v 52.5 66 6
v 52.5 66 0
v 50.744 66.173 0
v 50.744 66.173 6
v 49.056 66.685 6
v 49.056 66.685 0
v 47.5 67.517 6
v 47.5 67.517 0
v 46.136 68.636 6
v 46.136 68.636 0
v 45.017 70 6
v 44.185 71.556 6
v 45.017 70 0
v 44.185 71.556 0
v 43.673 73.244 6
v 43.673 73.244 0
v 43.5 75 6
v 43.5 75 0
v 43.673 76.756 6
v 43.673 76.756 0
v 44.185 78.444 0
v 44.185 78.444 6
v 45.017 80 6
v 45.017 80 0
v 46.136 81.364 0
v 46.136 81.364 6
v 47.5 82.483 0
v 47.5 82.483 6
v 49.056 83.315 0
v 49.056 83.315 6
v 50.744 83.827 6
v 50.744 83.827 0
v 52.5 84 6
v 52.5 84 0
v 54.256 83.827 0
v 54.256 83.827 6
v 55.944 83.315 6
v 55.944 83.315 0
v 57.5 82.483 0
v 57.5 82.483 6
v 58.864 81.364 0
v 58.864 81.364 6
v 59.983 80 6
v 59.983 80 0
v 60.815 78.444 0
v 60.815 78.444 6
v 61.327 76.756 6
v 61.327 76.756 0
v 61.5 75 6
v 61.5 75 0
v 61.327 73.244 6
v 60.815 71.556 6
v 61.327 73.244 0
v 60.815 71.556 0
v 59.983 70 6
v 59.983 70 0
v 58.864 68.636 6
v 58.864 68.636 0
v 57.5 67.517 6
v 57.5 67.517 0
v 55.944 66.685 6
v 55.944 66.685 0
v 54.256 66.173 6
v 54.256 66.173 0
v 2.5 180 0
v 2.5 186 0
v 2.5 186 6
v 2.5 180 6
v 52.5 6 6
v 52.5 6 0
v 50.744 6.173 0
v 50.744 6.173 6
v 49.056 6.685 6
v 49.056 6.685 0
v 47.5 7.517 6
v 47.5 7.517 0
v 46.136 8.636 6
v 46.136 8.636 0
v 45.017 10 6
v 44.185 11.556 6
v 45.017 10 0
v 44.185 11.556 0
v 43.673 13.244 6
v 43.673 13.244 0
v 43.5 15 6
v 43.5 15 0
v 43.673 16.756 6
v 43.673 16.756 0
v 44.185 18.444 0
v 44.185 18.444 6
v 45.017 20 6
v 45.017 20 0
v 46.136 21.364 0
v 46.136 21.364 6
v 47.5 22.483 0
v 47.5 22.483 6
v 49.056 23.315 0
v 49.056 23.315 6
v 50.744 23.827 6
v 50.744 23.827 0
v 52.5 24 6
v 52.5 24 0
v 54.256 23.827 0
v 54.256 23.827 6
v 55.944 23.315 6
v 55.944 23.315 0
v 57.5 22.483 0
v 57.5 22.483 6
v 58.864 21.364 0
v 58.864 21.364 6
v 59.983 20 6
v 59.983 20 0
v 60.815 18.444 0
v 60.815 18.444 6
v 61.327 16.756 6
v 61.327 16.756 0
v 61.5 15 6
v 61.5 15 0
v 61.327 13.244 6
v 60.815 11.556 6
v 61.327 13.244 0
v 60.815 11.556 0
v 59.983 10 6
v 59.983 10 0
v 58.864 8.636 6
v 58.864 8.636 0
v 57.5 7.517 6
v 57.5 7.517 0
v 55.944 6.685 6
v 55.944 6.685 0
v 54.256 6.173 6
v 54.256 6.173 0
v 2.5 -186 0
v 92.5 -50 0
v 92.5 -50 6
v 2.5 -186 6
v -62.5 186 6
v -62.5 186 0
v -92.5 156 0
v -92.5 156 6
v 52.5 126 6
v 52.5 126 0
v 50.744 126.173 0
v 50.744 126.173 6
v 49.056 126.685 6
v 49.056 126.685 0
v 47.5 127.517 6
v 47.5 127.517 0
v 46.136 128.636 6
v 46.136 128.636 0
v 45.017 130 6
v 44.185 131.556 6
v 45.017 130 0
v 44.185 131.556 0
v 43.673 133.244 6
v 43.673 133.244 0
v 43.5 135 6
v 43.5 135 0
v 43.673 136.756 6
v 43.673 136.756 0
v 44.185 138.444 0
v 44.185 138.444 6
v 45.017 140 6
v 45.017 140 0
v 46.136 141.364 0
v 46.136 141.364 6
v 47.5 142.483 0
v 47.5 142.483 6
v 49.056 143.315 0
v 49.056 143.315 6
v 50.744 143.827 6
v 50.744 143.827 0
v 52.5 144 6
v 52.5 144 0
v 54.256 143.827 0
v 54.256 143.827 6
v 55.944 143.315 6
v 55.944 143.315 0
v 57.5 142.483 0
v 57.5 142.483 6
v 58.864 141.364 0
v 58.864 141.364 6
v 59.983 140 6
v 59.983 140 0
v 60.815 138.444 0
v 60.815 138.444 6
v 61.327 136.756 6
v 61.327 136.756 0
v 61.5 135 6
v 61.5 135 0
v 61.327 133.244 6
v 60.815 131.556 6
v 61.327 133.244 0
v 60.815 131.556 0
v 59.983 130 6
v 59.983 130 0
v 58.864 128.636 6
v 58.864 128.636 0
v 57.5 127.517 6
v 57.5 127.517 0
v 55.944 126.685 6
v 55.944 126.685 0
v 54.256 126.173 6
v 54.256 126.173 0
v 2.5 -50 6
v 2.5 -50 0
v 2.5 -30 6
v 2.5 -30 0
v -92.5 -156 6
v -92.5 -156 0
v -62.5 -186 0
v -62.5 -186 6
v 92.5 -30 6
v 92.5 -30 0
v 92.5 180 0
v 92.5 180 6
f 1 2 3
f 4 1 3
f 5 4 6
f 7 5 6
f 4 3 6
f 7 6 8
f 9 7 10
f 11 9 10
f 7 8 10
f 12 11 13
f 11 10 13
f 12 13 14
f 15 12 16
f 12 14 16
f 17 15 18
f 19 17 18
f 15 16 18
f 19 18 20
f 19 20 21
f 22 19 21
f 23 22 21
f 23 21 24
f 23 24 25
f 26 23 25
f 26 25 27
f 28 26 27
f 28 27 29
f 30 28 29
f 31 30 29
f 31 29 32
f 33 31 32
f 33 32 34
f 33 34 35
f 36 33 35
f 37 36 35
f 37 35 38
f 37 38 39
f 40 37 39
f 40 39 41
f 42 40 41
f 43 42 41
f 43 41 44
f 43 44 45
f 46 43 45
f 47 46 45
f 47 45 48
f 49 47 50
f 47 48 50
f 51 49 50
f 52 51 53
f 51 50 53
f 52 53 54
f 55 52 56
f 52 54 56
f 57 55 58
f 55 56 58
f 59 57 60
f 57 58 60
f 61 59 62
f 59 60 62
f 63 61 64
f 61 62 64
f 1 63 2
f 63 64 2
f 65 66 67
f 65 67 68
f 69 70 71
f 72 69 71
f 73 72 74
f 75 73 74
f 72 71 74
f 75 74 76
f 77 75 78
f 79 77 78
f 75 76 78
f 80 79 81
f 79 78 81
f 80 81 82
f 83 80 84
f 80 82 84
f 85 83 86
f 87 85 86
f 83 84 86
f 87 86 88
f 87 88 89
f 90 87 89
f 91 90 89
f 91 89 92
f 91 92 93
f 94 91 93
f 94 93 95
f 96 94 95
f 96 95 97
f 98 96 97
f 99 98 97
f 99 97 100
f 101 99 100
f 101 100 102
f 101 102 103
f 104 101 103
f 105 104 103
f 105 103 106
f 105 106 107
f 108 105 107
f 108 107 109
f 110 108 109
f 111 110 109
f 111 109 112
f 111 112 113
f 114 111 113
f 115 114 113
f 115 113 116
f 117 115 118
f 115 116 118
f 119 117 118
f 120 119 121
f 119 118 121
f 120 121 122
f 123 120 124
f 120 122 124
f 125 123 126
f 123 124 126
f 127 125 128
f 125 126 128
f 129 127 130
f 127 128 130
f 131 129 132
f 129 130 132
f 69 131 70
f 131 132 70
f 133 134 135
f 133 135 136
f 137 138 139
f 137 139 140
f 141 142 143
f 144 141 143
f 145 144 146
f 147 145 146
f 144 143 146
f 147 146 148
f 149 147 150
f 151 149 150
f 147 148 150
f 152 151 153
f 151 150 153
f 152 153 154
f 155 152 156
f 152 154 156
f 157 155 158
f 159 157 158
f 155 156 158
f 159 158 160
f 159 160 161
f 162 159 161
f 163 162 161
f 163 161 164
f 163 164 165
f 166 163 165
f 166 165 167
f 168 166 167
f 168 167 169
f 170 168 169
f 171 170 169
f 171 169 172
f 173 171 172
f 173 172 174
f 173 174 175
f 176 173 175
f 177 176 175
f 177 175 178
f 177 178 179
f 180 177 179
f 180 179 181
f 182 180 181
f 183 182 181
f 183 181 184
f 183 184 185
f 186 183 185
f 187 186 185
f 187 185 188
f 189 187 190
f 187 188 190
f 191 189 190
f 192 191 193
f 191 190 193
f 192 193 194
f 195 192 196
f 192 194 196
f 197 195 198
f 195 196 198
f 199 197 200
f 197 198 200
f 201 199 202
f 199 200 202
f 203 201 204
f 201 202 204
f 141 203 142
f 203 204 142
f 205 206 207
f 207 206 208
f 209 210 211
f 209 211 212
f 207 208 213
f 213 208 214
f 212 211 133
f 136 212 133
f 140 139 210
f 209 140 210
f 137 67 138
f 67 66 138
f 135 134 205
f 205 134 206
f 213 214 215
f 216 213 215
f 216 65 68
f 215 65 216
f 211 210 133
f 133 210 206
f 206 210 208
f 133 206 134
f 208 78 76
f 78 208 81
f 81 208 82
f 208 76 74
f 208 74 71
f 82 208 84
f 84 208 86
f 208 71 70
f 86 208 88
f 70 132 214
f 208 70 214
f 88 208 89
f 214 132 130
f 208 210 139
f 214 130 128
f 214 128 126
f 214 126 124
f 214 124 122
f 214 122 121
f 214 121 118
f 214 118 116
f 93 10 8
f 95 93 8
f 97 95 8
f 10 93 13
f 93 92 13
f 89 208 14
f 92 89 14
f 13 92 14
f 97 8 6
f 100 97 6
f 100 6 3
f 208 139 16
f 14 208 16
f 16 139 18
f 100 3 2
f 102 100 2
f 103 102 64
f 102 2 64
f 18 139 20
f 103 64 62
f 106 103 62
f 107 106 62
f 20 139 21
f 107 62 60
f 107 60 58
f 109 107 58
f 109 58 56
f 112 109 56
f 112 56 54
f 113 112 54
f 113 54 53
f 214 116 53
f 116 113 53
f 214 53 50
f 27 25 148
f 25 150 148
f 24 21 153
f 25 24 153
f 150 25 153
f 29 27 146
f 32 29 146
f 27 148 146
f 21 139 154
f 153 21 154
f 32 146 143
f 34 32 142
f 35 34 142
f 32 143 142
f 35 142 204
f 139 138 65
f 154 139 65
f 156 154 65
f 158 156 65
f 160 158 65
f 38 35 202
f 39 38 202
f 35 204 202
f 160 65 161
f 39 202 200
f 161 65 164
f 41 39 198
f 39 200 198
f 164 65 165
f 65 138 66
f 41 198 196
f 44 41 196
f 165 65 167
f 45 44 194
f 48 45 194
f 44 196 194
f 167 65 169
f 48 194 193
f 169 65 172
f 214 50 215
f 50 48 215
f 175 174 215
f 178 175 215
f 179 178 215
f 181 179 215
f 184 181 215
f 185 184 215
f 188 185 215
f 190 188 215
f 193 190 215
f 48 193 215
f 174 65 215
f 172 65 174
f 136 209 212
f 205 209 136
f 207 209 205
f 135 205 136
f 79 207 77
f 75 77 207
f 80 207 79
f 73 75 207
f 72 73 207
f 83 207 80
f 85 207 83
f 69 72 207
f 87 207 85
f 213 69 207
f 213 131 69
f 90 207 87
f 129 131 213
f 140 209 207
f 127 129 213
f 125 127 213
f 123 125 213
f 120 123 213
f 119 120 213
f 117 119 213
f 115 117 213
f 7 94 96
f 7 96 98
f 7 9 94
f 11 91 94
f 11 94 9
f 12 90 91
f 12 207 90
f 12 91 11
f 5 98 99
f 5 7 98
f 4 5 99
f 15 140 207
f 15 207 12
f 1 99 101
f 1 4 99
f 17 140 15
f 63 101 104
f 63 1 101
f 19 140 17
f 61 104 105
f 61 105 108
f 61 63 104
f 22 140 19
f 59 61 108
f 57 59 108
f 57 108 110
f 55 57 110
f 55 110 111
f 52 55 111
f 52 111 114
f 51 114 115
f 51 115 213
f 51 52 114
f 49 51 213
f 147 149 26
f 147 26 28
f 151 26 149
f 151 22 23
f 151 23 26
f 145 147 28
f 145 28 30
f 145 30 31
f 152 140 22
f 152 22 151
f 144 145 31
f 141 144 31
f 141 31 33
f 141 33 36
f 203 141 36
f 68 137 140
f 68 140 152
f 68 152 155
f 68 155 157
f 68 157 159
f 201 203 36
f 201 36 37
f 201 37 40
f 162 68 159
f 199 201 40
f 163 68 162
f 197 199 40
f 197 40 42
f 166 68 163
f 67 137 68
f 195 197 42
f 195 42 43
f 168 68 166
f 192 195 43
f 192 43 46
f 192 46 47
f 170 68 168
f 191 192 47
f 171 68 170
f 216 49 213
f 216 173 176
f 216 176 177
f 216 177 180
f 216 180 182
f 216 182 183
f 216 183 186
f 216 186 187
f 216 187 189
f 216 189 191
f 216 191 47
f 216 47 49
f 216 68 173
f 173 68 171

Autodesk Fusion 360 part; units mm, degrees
sketch "スケッチ1" plane through (0, 0, 0) normal (0, 0, 1) x (1, 0, 0)
  line L0 (2.5, 186) -> (-92.5, 186)
  line L1 (-92.5, 186) -> (-92.5, -186)
  line L2 (-92.5, -186) -> (2.5, -186)
  line L3 (92.5, -30) -> (92.5, 180)
  line L4 (89.5161, 180) -> (-92.5, -186) construction
  line L5 (-92.5, 186) -> (53.8847, -108.352) construction
  line L6 (2.5, 186) -> (2.5, 180)
  line L7 (2.5, 180) -> (92.5, 180)
  line L8 (-92.5, -186) -> (2.5, -186) construction
  line L9 (92.5, -50) -> (2.5, -186)
  line L10 (92.5, -50) -> (2.5, -50)
  line L11 (2.5, -50) -> (2.5, -30)
  line L12 (2.5, -30) -> (92.5, -30)
  dimension "d2" = 372
  dimension "d5" = 95
  dimension "d7" = 90
  dimension "d8" = 20
extrude "押し出し1" add sketch "スケッチ1" along normal blind 6
chamfer "面取り1" distance 30 angle 45 2 edges at (-92.5, -186, 3) (-92.5, 186, 3)
sketch "スケッチ2" plane through (0, 0, 6) normal (0, 0, 1) x (-1, 0, 0)
  line L0 (62.5, -186) -> (92.5, -156)
  line L1 (92.5, -156) -> (92.5, 156)
  line L2 (92.5, 156) -> (62.5, 186)
  line L3 (62.5, 186) -> (-2.5, 186)
  line L4 (-2.5, 186) -> (-92.5, 50)
  line L5 (-92.5, 50) -> (-2.5, 50)
  line L6 (-2.5, 50) -> (-2.5, 30)
  line L7 (-2.5, 30) -> (-92.5, 30)
  line L8 (-92.5, 30) -> (-92.5, -180)
  line L9 (-92.5, -180) -> (-2.5, -180)
  line L10 (-2.5, -180) -> (-2.5, -186)
  line L11 (-2.5, -186) -> (62.5, -186)
  line L12 (-92.5, -180) -> (-52.5, -180) construction
  line L13 (-52.5, -180) -> (-52.5, -135) construction
  line L14 (-52.5, -135) -> (-92.5, -135) construction
  line L15 (-92.5, -135) -> (-92.5, -180) construction
  line L16 (-52.5, -135) -> (-52.5, -75) construction
  line L17 (-52.5, -75) -> (-52.5, -15) construction
  point P0 (-52.5, -135)
  point P1 (-52.5, -75)
  dimension "d12" = 40
  dimension "d13" = 45
  dimension "d14" = 60
  dimension "d15" = 60
hole "穴1" at (52.5, 135, 6) at (52.5, 75, 6) at (52.5, 15, 6) direction (0, 0, -1) diameter 18 end through all
equation "d5 = 30 mm + 65 mm"
